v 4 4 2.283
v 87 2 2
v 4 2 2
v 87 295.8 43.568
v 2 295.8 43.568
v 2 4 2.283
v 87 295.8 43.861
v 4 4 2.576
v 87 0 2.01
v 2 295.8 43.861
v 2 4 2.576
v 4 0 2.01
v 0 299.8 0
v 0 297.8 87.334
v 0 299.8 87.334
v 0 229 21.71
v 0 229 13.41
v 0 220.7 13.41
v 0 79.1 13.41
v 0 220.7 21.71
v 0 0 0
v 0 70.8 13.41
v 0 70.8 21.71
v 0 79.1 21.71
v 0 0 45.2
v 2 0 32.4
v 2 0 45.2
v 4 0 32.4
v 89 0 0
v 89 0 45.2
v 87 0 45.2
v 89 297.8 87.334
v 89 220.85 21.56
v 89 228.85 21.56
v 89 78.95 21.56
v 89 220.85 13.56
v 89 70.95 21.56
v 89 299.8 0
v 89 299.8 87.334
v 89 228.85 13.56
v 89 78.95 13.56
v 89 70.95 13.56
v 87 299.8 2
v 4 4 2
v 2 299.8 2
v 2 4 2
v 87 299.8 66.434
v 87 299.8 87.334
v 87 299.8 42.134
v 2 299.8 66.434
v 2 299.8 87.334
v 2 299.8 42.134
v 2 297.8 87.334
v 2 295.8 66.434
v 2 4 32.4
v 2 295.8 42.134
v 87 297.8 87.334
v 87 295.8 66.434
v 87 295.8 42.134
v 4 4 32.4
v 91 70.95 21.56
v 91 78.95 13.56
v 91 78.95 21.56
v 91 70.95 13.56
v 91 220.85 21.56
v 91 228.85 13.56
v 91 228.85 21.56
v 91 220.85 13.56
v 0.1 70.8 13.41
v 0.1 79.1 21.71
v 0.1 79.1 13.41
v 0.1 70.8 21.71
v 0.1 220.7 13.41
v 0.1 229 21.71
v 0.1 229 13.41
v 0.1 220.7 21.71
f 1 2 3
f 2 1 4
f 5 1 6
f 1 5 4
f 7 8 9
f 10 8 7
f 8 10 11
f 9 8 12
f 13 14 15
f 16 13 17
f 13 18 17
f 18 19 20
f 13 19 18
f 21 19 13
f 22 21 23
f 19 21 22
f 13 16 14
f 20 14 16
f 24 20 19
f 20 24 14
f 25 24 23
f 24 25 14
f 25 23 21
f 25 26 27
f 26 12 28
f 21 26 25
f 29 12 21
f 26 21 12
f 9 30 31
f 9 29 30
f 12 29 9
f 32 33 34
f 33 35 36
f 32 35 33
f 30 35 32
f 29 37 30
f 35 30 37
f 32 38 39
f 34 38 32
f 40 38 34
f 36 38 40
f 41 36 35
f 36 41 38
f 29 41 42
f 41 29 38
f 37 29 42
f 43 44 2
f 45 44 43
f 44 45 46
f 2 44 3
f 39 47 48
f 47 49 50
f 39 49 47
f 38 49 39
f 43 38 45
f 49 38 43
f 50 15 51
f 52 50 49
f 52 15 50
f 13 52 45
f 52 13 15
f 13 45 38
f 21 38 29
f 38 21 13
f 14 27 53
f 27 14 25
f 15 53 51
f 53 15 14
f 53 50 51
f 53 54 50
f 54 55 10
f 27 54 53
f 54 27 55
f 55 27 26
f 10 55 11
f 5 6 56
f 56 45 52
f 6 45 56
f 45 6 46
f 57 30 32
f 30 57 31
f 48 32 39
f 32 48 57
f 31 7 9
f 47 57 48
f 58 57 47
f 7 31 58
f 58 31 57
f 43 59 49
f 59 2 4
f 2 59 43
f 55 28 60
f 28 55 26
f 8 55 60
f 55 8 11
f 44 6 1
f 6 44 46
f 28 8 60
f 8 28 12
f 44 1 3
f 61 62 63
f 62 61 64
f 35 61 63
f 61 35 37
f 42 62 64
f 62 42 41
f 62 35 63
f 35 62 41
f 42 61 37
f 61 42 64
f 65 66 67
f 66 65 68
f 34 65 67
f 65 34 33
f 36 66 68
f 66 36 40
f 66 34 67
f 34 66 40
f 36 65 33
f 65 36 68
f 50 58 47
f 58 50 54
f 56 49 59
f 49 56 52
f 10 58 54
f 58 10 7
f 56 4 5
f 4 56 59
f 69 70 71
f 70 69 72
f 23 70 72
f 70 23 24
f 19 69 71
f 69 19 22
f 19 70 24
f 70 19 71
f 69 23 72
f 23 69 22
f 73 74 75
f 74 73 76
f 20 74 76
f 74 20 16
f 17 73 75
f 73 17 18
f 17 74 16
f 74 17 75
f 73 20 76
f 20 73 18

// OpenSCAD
// FIFO Gravity-Feed Can Dispenser — Parametric Design
// Pipeline Cycle 7 — 2026-03-16
// Supports: 12oz beverage, 12oz food, 15oz (#303), 28oz (#2.5), Custom
// Parametric shelf depth: 10", 12", 14", 16"
// Modular lane system — print single lanes, snap together

/* [Can Size Preset] */
can_preset = "15oz"; // ["12oz_bev", "12oz_food", "15oz", "28oz", "Custom"]

/* [Custom Can Dimensions (only when can_preset = Custom)] */
custom_can_dia = 81;    // mm — diameter of custom can
custom_can_height = 113; // mm — height of custom can

/* [Shelf Configuration] */
shelf_depth_inches = 12; // [10:1:16] Pantry shelf depth in inches
cans_per_lane = 6;       // [4:1:8] Number of cans the lane holds

/* [Structural] */
wall_thickness = 2.0;    // mm
base_thickness = 2.0;    // mm
side_wall_height_pct = 40; // [30:5:60] % of can height for side walls
ramp_angle = 8;          // [5:1:15] degrees — slope for gravity feed
can_clearance = 2.0;     // mm — clearance on each side of can
snap_tab_width = 8;      // mm — width of snap connector tabs
snap_tab_depth = 2.0;    // mm — depth of snap tab protrusion

/* [Advanced] */
$fn = 48;
// Set to true to render the snap connectors for multi-lane assembly
render_connectors = true;

// ============================================================
// Can Dimension Database
// ============================================================

// Can dimensions: [diameter_mm, height_mm, label]
function can_dims(preset) =
    preset == "12oz_bev"  ? [66, 123, "12oz Beverage"] :
    preset == "12oz_food" ? [68, 101, "12oz Food (#1)"] :
    preset == "15oz"      ? [81, 113, "15oz (#303)"] :
    preset == "28oz"      ? [103, 119, "28oz (#2.5)"] :
    [custom_can_dia, custom_can_height, "Custom"];

_can = can_dims(can_preset);
_can_dia = _can[0];
_can_h = _can[1];

// Shelf depth in mm
_shelf_depth = shelf_depth_inches * 25.4;

// Lane dimensions
_lane_width = _can_dia + can_clearance * 2 + wall_thickness * 2;
_lane_depth = _shelf_depth - 5; // 5mm clearance from shelf edge
_side_wall_h = _can_h * (side_wall_height_pct / 100);

// Ramp geometry
_ramp_rise = _lane_depth * tan(ramp_angle);

// Loading slot height (top-rear opening)
_load_slot_h = _can_h + 10; // Can height + clearance for dropping in

// Dispense slot height (bottom-front opening)
_dispense_slot_h = _can_h + 5;

// Total lane height
_lane_height = _ramp_rise + _can_h + 15; // Rise + can + margin

// ============================================================
// Info Echo
// ============================================================

echo("=== FIFO Can Dispenser Configuration ===");
echo(str("Can preset: ", can_preset, " (", _can[2], ")"));
echo(str("Can diameter: ", _can_dia, "mm"));
echo(str("Can height: ", _can_h, "mm"));
echo(str("Shelf depth: ", shelf_depth_inches, "\" (", _shelf_depth, "mm)"));
echo(str("Cans per lane: ", cans_per_lane));
echo(str("Lane width: ", _lane_width, "mm"));
echo(str("Lane depth: ", _lane_depth, "mm"));
echo(str("Ramp angle: ", ramp_angle, " degrees"));
echo(str("Ramp rise: ", _ramp_rise, "mm"));
echo(str("Estimated filament: ~", round(_lane_width * _lane_depth * _lane_height * 0.00003 * 1.2), "g"));

// ============================================================
// Modules
// ============================================================

// The main ramp surface — angled floor for gravity feed
module ramp_floor() {
    // Angled bottom surface
    hull() {
        // Front-bottom edge (dispense end)
        translate([0, 0, base_thickness])
            cube([_lane_width, base_thickness, 0.01]);

        // Rear-top edge (loading end)
        translate([0, _lane_depth - base_thickness, base_thickness + _ramp_rise])
            cube([_lane_width, base_thickness, 0.01]);
    }

    // Solid base under the ramp
    cube([_lane_width, _lane_depth, base_thickness]);
}

// Side walls — keep cans from rolling off
module side_walls() {
    // Left wall
    hull() {
        translate([0, 0, 0])
            cube([wall_thickness, _lane_depth, _side_wall_h]);
        translate([0, _lane_depth - wall_thickness, _ramp_rise])
            cube([wall_thickness, wall_thickness, _side_wall_h]);
    }

    // Right wall
    hull() {
        translate([_lane_width - wall_thickness, 0, 0])
            cube([wall_thickness, _lane_depth, _side_wall_h]);
        translate([_lane_width - wall_thickness, _lane_depth - wall_thickness, _ramp_rise])
            cube([wall_thickness, wall_thickness, _side_wall_h]);
    }
}

// Front stop — prevents cans from rolling out (with dispense opening)
module front_stop() {
    _stop_height = _can_dia * 0.4; // Partial wall — can is grabbed from above

    // Front wall with dispense opening
    difference() {
        cube([_lane_width, wall_thickness * 2, _stop_height]);

        // Dispense opening — sized for one can to be pulled out
        translate([wall_thickness + can_clearance, -0.01, base_thickness])
            cube([_can_dia + can_clearance, wall_thickness * 2 + 0.02, _stop_height]);
    }
}

// Rear loading guide — angled lip to guide cans into the lane
module rear_loading_guide() {
    translate([0, _lane_depth - wall_thickness * 2, _ramp_rise]) {
        // Rear wall — short, just to guide cans
        cube([_lane_width, wall_thickness * 2, _can_dia * 0.3]);
    }
}

// Snap connector tabs — for joining multiple lanes side by side
module snap_connectors() {
    if (render_connectors) {
        // Right side — protruding tabs
        for (y_pos = [_lane_depth * 0.25, _lane_depth * 0.75]) {
            translate([_lane_width, y_pos - snap_tab_width / 2, _side_wall_h * 0.3]) {
                // Tab
                cube([snap_tab_depth, snap_tab_width, snap_tab_width]);
            }
        }

        // Left side — receiving slots (cut into wall)
        // These are cut as part of the difference in the main assembly
    }
}

module snap_connector_cutouts() {
    if (render_connectors) {
        for (y_pos = [_lane_depth * 0.25, _lane_depth * 0.75]) {
            translate([-snap_tab_depth - 0.1, y_pos - snap_tab_width / 2 - 0.15, _side_wall_h * 0.3 - 0.15]) {
                cube([snap_tab_depth + 0.2, snap_tab_width + 0.3, snap_tab_width + 0.3]);
            }
        }
    }
}

// ============================================================
// Assembly — Single Lane
// ============================================================

module single_lane() {
    difference() {
        union() {
            ramp_floor();
            side_walls();
            front_stop();
            rear_loading_guide();
            snap_connectors();
        }

        // Cut snap connector receiving slots on the left side
        snap_connector_cutouts();
    }
}

// ============================================================
// Render
// ============================================================

single_lane();

// ============================================================
// Print Notes
// ============================================================
// ORIENTATION: Print with the front (dispense end) facing down on the
// build plate. The ramp angle creates a slight slope — if printed flat,
// the ramp is built into the geometry and needs no supports.
//
// ALTERNATIVE: Print flat (ramp side down). The slight angle means the
// base sits flat on the build plate and the ramp is the natural top surface.
// This is the recommended orientation — no supports needed.
//
// MODULAR ASSEMBLY:
// - Print multiple lanes separately
// - Snap tabs on right side fit into slots on left side of adjacent lane
// - Push together firmly — PETG flex allows snap-fit
// - For permanent assembly, add a drop of CA glue
//
// MATERIAL: PETG recommended (pantry temperature stability, durability)
//           PLA acceptable (pantry is a dry, room-temp environment)
//
// FILAMENT OPTIMIZATION:
// The rebeltaz design uses ~1000g per unit. Our modular lane design uses
// ~150-200g per lane depending on can size and shelf depth. A 3-lane
// setup uses ~500g — half the rebeltaz monolith for more capacity.
